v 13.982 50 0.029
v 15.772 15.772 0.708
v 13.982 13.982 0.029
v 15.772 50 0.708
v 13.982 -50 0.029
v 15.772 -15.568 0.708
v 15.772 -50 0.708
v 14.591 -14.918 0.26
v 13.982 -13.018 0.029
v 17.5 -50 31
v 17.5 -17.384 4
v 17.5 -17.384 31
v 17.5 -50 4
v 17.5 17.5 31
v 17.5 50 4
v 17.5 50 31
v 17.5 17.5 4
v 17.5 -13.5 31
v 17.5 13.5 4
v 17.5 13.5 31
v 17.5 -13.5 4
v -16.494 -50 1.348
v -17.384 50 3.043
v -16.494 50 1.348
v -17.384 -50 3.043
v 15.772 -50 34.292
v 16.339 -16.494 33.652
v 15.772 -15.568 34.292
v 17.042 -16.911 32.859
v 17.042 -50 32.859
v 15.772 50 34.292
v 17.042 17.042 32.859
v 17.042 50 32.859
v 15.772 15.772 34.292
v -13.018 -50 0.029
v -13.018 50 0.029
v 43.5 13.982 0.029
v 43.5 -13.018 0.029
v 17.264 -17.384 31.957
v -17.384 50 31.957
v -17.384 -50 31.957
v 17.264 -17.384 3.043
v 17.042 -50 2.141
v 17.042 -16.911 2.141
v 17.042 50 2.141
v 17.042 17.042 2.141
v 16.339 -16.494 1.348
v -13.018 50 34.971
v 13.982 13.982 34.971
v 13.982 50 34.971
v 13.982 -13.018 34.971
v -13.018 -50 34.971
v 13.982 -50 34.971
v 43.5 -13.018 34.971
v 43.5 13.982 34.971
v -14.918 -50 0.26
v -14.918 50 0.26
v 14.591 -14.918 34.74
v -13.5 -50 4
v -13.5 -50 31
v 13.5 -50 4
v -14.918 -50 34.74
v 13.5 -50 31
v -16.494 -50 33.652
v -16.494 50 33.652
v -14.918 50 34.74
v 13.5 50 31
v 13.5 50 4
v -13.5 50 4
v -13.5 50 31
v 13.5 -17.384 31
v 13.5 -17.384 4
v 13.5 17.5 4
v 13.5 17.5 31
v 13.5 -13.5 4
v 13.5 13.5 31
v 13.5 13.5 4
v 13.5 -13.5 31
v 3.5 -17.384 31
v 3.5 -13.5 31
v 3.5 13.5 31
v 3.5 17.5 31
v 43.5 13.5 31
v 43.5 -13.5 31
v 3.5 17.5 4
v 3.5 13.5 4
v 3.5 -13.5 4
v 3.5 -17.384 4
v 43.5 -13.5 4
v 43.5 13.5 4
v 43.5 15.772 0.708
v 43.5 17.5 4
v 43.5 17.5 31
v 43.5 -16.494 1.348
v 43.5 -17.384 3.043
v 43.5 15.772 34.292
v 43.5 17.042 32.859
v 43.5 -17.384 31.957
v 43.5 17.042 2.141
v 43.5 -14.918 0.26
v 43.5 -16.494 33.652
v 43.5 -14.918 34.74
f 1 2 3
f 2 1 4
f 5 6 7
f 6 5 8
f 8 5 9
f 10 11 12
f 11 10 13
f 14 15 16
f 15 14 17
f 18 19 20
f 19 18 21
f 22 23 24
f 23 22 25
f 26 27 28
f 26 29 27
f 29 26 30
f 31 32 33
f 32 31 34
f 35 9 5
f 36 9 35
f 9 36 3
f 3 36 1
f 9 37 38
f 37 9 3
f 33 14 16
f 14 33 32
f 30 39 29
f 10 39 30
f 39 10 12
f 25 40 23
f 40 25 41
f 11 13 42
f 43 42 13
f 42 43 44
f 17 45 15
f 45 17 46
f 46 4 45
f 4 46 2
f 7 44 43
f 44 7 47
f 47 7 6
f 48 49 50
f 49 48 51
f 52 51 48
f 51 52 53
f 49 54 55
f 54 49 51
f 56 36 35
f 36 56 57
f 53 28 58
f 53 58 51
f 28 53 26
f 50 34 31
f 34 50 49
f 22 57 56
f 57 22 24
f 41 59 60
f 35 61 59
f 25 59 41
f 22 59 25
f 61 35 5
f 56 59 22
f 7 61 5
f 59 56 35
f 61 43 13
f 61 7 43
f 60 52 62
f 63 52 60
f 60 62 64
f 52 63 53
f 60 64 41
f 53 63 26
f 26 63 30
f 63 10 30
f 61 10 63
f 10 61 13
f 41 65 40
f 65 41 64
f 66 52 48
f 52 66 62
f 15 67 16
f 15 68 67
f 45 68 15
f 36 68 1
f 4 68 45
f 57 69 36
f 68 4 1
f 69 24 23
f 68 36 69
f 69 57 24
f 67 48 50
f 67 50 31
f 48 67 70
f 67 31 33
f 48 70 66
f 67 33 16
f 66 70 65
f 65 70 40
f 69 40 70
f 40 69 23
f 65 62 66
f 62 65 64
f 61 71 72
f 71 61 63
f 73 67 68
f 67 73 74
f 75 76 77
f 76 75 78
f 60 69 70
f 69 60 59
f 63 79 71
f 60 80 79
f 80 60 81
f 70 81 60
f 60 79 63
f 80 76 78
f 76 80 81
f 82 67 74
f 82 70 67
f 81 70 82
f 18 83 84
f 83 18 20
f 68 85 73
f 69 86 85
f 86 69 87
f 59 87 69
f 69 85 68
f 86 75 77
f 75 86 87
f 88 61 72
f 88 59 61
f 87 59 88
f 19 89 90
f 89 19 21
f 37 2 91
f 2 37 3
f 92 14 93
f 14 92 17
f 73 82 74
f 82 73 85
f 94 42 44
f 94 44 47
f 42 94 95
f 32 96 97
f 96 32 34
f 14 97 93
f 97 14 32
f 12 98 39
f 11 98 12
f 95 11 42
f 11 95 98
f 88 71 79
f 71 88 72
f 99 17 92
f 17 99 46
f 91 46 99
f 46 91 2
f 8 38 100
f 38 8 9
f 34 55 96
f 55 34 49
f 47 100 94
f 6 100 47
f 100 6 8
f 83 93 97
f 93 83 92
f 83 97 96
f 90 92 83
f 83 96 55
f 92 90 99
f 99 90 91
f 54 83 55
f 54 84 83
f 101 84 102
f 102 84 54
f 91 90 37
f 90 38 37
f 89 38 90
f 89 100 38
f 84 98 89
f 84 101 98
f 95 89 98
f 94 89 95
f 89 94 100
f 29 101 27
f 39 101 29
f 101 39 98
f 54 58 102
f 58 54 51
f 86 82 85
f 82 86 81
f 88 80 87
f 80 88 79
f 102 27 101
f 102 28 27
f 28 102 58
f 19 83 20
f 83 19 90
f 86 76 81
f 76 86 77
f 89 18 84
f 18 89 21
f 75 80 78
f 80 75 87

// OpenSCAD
lengthY = 100;
lengthX = 40;
woodX = 27;
wallThick = 4;
union() {
    translate([0,0,0.5*woodX+wallThick])
        rotate([90,0,0]) attache(woodX,woodX,lengthY,wallThick);
    translate([(lengthX/2+woodX)/2,0,0.5*woodX+wallThick])
        rotate([90,0,90]) attache(woodX,woodX,lengthX,wallThick);
}

module attache(sizeX,sizeY,sizeZ,thick)
difference() {
    roundedBox(sizeX+2*thick,sizeY+2*thick,sizeZ, thick);
    cube([sizeX,sizeY,sizeZ], true);
}

module roundedBox(x,y,z,rad){
	hull() {
        translate([-x/2+rad, y/2-rad,-z/2]) cylinder(h=z,r=rad);
        translate([ x/2-rad, y/2-rad,-z/2]) cylinder(h=z,r=rad);
        translate([-x/2+rad,-y/2+rad,-z/2]) cylinder(h=z,r=rad);
        translate([ x/2-rad,-y/2+rad,-z/2]) cylinder(h=z,r=rad);
   }
}
